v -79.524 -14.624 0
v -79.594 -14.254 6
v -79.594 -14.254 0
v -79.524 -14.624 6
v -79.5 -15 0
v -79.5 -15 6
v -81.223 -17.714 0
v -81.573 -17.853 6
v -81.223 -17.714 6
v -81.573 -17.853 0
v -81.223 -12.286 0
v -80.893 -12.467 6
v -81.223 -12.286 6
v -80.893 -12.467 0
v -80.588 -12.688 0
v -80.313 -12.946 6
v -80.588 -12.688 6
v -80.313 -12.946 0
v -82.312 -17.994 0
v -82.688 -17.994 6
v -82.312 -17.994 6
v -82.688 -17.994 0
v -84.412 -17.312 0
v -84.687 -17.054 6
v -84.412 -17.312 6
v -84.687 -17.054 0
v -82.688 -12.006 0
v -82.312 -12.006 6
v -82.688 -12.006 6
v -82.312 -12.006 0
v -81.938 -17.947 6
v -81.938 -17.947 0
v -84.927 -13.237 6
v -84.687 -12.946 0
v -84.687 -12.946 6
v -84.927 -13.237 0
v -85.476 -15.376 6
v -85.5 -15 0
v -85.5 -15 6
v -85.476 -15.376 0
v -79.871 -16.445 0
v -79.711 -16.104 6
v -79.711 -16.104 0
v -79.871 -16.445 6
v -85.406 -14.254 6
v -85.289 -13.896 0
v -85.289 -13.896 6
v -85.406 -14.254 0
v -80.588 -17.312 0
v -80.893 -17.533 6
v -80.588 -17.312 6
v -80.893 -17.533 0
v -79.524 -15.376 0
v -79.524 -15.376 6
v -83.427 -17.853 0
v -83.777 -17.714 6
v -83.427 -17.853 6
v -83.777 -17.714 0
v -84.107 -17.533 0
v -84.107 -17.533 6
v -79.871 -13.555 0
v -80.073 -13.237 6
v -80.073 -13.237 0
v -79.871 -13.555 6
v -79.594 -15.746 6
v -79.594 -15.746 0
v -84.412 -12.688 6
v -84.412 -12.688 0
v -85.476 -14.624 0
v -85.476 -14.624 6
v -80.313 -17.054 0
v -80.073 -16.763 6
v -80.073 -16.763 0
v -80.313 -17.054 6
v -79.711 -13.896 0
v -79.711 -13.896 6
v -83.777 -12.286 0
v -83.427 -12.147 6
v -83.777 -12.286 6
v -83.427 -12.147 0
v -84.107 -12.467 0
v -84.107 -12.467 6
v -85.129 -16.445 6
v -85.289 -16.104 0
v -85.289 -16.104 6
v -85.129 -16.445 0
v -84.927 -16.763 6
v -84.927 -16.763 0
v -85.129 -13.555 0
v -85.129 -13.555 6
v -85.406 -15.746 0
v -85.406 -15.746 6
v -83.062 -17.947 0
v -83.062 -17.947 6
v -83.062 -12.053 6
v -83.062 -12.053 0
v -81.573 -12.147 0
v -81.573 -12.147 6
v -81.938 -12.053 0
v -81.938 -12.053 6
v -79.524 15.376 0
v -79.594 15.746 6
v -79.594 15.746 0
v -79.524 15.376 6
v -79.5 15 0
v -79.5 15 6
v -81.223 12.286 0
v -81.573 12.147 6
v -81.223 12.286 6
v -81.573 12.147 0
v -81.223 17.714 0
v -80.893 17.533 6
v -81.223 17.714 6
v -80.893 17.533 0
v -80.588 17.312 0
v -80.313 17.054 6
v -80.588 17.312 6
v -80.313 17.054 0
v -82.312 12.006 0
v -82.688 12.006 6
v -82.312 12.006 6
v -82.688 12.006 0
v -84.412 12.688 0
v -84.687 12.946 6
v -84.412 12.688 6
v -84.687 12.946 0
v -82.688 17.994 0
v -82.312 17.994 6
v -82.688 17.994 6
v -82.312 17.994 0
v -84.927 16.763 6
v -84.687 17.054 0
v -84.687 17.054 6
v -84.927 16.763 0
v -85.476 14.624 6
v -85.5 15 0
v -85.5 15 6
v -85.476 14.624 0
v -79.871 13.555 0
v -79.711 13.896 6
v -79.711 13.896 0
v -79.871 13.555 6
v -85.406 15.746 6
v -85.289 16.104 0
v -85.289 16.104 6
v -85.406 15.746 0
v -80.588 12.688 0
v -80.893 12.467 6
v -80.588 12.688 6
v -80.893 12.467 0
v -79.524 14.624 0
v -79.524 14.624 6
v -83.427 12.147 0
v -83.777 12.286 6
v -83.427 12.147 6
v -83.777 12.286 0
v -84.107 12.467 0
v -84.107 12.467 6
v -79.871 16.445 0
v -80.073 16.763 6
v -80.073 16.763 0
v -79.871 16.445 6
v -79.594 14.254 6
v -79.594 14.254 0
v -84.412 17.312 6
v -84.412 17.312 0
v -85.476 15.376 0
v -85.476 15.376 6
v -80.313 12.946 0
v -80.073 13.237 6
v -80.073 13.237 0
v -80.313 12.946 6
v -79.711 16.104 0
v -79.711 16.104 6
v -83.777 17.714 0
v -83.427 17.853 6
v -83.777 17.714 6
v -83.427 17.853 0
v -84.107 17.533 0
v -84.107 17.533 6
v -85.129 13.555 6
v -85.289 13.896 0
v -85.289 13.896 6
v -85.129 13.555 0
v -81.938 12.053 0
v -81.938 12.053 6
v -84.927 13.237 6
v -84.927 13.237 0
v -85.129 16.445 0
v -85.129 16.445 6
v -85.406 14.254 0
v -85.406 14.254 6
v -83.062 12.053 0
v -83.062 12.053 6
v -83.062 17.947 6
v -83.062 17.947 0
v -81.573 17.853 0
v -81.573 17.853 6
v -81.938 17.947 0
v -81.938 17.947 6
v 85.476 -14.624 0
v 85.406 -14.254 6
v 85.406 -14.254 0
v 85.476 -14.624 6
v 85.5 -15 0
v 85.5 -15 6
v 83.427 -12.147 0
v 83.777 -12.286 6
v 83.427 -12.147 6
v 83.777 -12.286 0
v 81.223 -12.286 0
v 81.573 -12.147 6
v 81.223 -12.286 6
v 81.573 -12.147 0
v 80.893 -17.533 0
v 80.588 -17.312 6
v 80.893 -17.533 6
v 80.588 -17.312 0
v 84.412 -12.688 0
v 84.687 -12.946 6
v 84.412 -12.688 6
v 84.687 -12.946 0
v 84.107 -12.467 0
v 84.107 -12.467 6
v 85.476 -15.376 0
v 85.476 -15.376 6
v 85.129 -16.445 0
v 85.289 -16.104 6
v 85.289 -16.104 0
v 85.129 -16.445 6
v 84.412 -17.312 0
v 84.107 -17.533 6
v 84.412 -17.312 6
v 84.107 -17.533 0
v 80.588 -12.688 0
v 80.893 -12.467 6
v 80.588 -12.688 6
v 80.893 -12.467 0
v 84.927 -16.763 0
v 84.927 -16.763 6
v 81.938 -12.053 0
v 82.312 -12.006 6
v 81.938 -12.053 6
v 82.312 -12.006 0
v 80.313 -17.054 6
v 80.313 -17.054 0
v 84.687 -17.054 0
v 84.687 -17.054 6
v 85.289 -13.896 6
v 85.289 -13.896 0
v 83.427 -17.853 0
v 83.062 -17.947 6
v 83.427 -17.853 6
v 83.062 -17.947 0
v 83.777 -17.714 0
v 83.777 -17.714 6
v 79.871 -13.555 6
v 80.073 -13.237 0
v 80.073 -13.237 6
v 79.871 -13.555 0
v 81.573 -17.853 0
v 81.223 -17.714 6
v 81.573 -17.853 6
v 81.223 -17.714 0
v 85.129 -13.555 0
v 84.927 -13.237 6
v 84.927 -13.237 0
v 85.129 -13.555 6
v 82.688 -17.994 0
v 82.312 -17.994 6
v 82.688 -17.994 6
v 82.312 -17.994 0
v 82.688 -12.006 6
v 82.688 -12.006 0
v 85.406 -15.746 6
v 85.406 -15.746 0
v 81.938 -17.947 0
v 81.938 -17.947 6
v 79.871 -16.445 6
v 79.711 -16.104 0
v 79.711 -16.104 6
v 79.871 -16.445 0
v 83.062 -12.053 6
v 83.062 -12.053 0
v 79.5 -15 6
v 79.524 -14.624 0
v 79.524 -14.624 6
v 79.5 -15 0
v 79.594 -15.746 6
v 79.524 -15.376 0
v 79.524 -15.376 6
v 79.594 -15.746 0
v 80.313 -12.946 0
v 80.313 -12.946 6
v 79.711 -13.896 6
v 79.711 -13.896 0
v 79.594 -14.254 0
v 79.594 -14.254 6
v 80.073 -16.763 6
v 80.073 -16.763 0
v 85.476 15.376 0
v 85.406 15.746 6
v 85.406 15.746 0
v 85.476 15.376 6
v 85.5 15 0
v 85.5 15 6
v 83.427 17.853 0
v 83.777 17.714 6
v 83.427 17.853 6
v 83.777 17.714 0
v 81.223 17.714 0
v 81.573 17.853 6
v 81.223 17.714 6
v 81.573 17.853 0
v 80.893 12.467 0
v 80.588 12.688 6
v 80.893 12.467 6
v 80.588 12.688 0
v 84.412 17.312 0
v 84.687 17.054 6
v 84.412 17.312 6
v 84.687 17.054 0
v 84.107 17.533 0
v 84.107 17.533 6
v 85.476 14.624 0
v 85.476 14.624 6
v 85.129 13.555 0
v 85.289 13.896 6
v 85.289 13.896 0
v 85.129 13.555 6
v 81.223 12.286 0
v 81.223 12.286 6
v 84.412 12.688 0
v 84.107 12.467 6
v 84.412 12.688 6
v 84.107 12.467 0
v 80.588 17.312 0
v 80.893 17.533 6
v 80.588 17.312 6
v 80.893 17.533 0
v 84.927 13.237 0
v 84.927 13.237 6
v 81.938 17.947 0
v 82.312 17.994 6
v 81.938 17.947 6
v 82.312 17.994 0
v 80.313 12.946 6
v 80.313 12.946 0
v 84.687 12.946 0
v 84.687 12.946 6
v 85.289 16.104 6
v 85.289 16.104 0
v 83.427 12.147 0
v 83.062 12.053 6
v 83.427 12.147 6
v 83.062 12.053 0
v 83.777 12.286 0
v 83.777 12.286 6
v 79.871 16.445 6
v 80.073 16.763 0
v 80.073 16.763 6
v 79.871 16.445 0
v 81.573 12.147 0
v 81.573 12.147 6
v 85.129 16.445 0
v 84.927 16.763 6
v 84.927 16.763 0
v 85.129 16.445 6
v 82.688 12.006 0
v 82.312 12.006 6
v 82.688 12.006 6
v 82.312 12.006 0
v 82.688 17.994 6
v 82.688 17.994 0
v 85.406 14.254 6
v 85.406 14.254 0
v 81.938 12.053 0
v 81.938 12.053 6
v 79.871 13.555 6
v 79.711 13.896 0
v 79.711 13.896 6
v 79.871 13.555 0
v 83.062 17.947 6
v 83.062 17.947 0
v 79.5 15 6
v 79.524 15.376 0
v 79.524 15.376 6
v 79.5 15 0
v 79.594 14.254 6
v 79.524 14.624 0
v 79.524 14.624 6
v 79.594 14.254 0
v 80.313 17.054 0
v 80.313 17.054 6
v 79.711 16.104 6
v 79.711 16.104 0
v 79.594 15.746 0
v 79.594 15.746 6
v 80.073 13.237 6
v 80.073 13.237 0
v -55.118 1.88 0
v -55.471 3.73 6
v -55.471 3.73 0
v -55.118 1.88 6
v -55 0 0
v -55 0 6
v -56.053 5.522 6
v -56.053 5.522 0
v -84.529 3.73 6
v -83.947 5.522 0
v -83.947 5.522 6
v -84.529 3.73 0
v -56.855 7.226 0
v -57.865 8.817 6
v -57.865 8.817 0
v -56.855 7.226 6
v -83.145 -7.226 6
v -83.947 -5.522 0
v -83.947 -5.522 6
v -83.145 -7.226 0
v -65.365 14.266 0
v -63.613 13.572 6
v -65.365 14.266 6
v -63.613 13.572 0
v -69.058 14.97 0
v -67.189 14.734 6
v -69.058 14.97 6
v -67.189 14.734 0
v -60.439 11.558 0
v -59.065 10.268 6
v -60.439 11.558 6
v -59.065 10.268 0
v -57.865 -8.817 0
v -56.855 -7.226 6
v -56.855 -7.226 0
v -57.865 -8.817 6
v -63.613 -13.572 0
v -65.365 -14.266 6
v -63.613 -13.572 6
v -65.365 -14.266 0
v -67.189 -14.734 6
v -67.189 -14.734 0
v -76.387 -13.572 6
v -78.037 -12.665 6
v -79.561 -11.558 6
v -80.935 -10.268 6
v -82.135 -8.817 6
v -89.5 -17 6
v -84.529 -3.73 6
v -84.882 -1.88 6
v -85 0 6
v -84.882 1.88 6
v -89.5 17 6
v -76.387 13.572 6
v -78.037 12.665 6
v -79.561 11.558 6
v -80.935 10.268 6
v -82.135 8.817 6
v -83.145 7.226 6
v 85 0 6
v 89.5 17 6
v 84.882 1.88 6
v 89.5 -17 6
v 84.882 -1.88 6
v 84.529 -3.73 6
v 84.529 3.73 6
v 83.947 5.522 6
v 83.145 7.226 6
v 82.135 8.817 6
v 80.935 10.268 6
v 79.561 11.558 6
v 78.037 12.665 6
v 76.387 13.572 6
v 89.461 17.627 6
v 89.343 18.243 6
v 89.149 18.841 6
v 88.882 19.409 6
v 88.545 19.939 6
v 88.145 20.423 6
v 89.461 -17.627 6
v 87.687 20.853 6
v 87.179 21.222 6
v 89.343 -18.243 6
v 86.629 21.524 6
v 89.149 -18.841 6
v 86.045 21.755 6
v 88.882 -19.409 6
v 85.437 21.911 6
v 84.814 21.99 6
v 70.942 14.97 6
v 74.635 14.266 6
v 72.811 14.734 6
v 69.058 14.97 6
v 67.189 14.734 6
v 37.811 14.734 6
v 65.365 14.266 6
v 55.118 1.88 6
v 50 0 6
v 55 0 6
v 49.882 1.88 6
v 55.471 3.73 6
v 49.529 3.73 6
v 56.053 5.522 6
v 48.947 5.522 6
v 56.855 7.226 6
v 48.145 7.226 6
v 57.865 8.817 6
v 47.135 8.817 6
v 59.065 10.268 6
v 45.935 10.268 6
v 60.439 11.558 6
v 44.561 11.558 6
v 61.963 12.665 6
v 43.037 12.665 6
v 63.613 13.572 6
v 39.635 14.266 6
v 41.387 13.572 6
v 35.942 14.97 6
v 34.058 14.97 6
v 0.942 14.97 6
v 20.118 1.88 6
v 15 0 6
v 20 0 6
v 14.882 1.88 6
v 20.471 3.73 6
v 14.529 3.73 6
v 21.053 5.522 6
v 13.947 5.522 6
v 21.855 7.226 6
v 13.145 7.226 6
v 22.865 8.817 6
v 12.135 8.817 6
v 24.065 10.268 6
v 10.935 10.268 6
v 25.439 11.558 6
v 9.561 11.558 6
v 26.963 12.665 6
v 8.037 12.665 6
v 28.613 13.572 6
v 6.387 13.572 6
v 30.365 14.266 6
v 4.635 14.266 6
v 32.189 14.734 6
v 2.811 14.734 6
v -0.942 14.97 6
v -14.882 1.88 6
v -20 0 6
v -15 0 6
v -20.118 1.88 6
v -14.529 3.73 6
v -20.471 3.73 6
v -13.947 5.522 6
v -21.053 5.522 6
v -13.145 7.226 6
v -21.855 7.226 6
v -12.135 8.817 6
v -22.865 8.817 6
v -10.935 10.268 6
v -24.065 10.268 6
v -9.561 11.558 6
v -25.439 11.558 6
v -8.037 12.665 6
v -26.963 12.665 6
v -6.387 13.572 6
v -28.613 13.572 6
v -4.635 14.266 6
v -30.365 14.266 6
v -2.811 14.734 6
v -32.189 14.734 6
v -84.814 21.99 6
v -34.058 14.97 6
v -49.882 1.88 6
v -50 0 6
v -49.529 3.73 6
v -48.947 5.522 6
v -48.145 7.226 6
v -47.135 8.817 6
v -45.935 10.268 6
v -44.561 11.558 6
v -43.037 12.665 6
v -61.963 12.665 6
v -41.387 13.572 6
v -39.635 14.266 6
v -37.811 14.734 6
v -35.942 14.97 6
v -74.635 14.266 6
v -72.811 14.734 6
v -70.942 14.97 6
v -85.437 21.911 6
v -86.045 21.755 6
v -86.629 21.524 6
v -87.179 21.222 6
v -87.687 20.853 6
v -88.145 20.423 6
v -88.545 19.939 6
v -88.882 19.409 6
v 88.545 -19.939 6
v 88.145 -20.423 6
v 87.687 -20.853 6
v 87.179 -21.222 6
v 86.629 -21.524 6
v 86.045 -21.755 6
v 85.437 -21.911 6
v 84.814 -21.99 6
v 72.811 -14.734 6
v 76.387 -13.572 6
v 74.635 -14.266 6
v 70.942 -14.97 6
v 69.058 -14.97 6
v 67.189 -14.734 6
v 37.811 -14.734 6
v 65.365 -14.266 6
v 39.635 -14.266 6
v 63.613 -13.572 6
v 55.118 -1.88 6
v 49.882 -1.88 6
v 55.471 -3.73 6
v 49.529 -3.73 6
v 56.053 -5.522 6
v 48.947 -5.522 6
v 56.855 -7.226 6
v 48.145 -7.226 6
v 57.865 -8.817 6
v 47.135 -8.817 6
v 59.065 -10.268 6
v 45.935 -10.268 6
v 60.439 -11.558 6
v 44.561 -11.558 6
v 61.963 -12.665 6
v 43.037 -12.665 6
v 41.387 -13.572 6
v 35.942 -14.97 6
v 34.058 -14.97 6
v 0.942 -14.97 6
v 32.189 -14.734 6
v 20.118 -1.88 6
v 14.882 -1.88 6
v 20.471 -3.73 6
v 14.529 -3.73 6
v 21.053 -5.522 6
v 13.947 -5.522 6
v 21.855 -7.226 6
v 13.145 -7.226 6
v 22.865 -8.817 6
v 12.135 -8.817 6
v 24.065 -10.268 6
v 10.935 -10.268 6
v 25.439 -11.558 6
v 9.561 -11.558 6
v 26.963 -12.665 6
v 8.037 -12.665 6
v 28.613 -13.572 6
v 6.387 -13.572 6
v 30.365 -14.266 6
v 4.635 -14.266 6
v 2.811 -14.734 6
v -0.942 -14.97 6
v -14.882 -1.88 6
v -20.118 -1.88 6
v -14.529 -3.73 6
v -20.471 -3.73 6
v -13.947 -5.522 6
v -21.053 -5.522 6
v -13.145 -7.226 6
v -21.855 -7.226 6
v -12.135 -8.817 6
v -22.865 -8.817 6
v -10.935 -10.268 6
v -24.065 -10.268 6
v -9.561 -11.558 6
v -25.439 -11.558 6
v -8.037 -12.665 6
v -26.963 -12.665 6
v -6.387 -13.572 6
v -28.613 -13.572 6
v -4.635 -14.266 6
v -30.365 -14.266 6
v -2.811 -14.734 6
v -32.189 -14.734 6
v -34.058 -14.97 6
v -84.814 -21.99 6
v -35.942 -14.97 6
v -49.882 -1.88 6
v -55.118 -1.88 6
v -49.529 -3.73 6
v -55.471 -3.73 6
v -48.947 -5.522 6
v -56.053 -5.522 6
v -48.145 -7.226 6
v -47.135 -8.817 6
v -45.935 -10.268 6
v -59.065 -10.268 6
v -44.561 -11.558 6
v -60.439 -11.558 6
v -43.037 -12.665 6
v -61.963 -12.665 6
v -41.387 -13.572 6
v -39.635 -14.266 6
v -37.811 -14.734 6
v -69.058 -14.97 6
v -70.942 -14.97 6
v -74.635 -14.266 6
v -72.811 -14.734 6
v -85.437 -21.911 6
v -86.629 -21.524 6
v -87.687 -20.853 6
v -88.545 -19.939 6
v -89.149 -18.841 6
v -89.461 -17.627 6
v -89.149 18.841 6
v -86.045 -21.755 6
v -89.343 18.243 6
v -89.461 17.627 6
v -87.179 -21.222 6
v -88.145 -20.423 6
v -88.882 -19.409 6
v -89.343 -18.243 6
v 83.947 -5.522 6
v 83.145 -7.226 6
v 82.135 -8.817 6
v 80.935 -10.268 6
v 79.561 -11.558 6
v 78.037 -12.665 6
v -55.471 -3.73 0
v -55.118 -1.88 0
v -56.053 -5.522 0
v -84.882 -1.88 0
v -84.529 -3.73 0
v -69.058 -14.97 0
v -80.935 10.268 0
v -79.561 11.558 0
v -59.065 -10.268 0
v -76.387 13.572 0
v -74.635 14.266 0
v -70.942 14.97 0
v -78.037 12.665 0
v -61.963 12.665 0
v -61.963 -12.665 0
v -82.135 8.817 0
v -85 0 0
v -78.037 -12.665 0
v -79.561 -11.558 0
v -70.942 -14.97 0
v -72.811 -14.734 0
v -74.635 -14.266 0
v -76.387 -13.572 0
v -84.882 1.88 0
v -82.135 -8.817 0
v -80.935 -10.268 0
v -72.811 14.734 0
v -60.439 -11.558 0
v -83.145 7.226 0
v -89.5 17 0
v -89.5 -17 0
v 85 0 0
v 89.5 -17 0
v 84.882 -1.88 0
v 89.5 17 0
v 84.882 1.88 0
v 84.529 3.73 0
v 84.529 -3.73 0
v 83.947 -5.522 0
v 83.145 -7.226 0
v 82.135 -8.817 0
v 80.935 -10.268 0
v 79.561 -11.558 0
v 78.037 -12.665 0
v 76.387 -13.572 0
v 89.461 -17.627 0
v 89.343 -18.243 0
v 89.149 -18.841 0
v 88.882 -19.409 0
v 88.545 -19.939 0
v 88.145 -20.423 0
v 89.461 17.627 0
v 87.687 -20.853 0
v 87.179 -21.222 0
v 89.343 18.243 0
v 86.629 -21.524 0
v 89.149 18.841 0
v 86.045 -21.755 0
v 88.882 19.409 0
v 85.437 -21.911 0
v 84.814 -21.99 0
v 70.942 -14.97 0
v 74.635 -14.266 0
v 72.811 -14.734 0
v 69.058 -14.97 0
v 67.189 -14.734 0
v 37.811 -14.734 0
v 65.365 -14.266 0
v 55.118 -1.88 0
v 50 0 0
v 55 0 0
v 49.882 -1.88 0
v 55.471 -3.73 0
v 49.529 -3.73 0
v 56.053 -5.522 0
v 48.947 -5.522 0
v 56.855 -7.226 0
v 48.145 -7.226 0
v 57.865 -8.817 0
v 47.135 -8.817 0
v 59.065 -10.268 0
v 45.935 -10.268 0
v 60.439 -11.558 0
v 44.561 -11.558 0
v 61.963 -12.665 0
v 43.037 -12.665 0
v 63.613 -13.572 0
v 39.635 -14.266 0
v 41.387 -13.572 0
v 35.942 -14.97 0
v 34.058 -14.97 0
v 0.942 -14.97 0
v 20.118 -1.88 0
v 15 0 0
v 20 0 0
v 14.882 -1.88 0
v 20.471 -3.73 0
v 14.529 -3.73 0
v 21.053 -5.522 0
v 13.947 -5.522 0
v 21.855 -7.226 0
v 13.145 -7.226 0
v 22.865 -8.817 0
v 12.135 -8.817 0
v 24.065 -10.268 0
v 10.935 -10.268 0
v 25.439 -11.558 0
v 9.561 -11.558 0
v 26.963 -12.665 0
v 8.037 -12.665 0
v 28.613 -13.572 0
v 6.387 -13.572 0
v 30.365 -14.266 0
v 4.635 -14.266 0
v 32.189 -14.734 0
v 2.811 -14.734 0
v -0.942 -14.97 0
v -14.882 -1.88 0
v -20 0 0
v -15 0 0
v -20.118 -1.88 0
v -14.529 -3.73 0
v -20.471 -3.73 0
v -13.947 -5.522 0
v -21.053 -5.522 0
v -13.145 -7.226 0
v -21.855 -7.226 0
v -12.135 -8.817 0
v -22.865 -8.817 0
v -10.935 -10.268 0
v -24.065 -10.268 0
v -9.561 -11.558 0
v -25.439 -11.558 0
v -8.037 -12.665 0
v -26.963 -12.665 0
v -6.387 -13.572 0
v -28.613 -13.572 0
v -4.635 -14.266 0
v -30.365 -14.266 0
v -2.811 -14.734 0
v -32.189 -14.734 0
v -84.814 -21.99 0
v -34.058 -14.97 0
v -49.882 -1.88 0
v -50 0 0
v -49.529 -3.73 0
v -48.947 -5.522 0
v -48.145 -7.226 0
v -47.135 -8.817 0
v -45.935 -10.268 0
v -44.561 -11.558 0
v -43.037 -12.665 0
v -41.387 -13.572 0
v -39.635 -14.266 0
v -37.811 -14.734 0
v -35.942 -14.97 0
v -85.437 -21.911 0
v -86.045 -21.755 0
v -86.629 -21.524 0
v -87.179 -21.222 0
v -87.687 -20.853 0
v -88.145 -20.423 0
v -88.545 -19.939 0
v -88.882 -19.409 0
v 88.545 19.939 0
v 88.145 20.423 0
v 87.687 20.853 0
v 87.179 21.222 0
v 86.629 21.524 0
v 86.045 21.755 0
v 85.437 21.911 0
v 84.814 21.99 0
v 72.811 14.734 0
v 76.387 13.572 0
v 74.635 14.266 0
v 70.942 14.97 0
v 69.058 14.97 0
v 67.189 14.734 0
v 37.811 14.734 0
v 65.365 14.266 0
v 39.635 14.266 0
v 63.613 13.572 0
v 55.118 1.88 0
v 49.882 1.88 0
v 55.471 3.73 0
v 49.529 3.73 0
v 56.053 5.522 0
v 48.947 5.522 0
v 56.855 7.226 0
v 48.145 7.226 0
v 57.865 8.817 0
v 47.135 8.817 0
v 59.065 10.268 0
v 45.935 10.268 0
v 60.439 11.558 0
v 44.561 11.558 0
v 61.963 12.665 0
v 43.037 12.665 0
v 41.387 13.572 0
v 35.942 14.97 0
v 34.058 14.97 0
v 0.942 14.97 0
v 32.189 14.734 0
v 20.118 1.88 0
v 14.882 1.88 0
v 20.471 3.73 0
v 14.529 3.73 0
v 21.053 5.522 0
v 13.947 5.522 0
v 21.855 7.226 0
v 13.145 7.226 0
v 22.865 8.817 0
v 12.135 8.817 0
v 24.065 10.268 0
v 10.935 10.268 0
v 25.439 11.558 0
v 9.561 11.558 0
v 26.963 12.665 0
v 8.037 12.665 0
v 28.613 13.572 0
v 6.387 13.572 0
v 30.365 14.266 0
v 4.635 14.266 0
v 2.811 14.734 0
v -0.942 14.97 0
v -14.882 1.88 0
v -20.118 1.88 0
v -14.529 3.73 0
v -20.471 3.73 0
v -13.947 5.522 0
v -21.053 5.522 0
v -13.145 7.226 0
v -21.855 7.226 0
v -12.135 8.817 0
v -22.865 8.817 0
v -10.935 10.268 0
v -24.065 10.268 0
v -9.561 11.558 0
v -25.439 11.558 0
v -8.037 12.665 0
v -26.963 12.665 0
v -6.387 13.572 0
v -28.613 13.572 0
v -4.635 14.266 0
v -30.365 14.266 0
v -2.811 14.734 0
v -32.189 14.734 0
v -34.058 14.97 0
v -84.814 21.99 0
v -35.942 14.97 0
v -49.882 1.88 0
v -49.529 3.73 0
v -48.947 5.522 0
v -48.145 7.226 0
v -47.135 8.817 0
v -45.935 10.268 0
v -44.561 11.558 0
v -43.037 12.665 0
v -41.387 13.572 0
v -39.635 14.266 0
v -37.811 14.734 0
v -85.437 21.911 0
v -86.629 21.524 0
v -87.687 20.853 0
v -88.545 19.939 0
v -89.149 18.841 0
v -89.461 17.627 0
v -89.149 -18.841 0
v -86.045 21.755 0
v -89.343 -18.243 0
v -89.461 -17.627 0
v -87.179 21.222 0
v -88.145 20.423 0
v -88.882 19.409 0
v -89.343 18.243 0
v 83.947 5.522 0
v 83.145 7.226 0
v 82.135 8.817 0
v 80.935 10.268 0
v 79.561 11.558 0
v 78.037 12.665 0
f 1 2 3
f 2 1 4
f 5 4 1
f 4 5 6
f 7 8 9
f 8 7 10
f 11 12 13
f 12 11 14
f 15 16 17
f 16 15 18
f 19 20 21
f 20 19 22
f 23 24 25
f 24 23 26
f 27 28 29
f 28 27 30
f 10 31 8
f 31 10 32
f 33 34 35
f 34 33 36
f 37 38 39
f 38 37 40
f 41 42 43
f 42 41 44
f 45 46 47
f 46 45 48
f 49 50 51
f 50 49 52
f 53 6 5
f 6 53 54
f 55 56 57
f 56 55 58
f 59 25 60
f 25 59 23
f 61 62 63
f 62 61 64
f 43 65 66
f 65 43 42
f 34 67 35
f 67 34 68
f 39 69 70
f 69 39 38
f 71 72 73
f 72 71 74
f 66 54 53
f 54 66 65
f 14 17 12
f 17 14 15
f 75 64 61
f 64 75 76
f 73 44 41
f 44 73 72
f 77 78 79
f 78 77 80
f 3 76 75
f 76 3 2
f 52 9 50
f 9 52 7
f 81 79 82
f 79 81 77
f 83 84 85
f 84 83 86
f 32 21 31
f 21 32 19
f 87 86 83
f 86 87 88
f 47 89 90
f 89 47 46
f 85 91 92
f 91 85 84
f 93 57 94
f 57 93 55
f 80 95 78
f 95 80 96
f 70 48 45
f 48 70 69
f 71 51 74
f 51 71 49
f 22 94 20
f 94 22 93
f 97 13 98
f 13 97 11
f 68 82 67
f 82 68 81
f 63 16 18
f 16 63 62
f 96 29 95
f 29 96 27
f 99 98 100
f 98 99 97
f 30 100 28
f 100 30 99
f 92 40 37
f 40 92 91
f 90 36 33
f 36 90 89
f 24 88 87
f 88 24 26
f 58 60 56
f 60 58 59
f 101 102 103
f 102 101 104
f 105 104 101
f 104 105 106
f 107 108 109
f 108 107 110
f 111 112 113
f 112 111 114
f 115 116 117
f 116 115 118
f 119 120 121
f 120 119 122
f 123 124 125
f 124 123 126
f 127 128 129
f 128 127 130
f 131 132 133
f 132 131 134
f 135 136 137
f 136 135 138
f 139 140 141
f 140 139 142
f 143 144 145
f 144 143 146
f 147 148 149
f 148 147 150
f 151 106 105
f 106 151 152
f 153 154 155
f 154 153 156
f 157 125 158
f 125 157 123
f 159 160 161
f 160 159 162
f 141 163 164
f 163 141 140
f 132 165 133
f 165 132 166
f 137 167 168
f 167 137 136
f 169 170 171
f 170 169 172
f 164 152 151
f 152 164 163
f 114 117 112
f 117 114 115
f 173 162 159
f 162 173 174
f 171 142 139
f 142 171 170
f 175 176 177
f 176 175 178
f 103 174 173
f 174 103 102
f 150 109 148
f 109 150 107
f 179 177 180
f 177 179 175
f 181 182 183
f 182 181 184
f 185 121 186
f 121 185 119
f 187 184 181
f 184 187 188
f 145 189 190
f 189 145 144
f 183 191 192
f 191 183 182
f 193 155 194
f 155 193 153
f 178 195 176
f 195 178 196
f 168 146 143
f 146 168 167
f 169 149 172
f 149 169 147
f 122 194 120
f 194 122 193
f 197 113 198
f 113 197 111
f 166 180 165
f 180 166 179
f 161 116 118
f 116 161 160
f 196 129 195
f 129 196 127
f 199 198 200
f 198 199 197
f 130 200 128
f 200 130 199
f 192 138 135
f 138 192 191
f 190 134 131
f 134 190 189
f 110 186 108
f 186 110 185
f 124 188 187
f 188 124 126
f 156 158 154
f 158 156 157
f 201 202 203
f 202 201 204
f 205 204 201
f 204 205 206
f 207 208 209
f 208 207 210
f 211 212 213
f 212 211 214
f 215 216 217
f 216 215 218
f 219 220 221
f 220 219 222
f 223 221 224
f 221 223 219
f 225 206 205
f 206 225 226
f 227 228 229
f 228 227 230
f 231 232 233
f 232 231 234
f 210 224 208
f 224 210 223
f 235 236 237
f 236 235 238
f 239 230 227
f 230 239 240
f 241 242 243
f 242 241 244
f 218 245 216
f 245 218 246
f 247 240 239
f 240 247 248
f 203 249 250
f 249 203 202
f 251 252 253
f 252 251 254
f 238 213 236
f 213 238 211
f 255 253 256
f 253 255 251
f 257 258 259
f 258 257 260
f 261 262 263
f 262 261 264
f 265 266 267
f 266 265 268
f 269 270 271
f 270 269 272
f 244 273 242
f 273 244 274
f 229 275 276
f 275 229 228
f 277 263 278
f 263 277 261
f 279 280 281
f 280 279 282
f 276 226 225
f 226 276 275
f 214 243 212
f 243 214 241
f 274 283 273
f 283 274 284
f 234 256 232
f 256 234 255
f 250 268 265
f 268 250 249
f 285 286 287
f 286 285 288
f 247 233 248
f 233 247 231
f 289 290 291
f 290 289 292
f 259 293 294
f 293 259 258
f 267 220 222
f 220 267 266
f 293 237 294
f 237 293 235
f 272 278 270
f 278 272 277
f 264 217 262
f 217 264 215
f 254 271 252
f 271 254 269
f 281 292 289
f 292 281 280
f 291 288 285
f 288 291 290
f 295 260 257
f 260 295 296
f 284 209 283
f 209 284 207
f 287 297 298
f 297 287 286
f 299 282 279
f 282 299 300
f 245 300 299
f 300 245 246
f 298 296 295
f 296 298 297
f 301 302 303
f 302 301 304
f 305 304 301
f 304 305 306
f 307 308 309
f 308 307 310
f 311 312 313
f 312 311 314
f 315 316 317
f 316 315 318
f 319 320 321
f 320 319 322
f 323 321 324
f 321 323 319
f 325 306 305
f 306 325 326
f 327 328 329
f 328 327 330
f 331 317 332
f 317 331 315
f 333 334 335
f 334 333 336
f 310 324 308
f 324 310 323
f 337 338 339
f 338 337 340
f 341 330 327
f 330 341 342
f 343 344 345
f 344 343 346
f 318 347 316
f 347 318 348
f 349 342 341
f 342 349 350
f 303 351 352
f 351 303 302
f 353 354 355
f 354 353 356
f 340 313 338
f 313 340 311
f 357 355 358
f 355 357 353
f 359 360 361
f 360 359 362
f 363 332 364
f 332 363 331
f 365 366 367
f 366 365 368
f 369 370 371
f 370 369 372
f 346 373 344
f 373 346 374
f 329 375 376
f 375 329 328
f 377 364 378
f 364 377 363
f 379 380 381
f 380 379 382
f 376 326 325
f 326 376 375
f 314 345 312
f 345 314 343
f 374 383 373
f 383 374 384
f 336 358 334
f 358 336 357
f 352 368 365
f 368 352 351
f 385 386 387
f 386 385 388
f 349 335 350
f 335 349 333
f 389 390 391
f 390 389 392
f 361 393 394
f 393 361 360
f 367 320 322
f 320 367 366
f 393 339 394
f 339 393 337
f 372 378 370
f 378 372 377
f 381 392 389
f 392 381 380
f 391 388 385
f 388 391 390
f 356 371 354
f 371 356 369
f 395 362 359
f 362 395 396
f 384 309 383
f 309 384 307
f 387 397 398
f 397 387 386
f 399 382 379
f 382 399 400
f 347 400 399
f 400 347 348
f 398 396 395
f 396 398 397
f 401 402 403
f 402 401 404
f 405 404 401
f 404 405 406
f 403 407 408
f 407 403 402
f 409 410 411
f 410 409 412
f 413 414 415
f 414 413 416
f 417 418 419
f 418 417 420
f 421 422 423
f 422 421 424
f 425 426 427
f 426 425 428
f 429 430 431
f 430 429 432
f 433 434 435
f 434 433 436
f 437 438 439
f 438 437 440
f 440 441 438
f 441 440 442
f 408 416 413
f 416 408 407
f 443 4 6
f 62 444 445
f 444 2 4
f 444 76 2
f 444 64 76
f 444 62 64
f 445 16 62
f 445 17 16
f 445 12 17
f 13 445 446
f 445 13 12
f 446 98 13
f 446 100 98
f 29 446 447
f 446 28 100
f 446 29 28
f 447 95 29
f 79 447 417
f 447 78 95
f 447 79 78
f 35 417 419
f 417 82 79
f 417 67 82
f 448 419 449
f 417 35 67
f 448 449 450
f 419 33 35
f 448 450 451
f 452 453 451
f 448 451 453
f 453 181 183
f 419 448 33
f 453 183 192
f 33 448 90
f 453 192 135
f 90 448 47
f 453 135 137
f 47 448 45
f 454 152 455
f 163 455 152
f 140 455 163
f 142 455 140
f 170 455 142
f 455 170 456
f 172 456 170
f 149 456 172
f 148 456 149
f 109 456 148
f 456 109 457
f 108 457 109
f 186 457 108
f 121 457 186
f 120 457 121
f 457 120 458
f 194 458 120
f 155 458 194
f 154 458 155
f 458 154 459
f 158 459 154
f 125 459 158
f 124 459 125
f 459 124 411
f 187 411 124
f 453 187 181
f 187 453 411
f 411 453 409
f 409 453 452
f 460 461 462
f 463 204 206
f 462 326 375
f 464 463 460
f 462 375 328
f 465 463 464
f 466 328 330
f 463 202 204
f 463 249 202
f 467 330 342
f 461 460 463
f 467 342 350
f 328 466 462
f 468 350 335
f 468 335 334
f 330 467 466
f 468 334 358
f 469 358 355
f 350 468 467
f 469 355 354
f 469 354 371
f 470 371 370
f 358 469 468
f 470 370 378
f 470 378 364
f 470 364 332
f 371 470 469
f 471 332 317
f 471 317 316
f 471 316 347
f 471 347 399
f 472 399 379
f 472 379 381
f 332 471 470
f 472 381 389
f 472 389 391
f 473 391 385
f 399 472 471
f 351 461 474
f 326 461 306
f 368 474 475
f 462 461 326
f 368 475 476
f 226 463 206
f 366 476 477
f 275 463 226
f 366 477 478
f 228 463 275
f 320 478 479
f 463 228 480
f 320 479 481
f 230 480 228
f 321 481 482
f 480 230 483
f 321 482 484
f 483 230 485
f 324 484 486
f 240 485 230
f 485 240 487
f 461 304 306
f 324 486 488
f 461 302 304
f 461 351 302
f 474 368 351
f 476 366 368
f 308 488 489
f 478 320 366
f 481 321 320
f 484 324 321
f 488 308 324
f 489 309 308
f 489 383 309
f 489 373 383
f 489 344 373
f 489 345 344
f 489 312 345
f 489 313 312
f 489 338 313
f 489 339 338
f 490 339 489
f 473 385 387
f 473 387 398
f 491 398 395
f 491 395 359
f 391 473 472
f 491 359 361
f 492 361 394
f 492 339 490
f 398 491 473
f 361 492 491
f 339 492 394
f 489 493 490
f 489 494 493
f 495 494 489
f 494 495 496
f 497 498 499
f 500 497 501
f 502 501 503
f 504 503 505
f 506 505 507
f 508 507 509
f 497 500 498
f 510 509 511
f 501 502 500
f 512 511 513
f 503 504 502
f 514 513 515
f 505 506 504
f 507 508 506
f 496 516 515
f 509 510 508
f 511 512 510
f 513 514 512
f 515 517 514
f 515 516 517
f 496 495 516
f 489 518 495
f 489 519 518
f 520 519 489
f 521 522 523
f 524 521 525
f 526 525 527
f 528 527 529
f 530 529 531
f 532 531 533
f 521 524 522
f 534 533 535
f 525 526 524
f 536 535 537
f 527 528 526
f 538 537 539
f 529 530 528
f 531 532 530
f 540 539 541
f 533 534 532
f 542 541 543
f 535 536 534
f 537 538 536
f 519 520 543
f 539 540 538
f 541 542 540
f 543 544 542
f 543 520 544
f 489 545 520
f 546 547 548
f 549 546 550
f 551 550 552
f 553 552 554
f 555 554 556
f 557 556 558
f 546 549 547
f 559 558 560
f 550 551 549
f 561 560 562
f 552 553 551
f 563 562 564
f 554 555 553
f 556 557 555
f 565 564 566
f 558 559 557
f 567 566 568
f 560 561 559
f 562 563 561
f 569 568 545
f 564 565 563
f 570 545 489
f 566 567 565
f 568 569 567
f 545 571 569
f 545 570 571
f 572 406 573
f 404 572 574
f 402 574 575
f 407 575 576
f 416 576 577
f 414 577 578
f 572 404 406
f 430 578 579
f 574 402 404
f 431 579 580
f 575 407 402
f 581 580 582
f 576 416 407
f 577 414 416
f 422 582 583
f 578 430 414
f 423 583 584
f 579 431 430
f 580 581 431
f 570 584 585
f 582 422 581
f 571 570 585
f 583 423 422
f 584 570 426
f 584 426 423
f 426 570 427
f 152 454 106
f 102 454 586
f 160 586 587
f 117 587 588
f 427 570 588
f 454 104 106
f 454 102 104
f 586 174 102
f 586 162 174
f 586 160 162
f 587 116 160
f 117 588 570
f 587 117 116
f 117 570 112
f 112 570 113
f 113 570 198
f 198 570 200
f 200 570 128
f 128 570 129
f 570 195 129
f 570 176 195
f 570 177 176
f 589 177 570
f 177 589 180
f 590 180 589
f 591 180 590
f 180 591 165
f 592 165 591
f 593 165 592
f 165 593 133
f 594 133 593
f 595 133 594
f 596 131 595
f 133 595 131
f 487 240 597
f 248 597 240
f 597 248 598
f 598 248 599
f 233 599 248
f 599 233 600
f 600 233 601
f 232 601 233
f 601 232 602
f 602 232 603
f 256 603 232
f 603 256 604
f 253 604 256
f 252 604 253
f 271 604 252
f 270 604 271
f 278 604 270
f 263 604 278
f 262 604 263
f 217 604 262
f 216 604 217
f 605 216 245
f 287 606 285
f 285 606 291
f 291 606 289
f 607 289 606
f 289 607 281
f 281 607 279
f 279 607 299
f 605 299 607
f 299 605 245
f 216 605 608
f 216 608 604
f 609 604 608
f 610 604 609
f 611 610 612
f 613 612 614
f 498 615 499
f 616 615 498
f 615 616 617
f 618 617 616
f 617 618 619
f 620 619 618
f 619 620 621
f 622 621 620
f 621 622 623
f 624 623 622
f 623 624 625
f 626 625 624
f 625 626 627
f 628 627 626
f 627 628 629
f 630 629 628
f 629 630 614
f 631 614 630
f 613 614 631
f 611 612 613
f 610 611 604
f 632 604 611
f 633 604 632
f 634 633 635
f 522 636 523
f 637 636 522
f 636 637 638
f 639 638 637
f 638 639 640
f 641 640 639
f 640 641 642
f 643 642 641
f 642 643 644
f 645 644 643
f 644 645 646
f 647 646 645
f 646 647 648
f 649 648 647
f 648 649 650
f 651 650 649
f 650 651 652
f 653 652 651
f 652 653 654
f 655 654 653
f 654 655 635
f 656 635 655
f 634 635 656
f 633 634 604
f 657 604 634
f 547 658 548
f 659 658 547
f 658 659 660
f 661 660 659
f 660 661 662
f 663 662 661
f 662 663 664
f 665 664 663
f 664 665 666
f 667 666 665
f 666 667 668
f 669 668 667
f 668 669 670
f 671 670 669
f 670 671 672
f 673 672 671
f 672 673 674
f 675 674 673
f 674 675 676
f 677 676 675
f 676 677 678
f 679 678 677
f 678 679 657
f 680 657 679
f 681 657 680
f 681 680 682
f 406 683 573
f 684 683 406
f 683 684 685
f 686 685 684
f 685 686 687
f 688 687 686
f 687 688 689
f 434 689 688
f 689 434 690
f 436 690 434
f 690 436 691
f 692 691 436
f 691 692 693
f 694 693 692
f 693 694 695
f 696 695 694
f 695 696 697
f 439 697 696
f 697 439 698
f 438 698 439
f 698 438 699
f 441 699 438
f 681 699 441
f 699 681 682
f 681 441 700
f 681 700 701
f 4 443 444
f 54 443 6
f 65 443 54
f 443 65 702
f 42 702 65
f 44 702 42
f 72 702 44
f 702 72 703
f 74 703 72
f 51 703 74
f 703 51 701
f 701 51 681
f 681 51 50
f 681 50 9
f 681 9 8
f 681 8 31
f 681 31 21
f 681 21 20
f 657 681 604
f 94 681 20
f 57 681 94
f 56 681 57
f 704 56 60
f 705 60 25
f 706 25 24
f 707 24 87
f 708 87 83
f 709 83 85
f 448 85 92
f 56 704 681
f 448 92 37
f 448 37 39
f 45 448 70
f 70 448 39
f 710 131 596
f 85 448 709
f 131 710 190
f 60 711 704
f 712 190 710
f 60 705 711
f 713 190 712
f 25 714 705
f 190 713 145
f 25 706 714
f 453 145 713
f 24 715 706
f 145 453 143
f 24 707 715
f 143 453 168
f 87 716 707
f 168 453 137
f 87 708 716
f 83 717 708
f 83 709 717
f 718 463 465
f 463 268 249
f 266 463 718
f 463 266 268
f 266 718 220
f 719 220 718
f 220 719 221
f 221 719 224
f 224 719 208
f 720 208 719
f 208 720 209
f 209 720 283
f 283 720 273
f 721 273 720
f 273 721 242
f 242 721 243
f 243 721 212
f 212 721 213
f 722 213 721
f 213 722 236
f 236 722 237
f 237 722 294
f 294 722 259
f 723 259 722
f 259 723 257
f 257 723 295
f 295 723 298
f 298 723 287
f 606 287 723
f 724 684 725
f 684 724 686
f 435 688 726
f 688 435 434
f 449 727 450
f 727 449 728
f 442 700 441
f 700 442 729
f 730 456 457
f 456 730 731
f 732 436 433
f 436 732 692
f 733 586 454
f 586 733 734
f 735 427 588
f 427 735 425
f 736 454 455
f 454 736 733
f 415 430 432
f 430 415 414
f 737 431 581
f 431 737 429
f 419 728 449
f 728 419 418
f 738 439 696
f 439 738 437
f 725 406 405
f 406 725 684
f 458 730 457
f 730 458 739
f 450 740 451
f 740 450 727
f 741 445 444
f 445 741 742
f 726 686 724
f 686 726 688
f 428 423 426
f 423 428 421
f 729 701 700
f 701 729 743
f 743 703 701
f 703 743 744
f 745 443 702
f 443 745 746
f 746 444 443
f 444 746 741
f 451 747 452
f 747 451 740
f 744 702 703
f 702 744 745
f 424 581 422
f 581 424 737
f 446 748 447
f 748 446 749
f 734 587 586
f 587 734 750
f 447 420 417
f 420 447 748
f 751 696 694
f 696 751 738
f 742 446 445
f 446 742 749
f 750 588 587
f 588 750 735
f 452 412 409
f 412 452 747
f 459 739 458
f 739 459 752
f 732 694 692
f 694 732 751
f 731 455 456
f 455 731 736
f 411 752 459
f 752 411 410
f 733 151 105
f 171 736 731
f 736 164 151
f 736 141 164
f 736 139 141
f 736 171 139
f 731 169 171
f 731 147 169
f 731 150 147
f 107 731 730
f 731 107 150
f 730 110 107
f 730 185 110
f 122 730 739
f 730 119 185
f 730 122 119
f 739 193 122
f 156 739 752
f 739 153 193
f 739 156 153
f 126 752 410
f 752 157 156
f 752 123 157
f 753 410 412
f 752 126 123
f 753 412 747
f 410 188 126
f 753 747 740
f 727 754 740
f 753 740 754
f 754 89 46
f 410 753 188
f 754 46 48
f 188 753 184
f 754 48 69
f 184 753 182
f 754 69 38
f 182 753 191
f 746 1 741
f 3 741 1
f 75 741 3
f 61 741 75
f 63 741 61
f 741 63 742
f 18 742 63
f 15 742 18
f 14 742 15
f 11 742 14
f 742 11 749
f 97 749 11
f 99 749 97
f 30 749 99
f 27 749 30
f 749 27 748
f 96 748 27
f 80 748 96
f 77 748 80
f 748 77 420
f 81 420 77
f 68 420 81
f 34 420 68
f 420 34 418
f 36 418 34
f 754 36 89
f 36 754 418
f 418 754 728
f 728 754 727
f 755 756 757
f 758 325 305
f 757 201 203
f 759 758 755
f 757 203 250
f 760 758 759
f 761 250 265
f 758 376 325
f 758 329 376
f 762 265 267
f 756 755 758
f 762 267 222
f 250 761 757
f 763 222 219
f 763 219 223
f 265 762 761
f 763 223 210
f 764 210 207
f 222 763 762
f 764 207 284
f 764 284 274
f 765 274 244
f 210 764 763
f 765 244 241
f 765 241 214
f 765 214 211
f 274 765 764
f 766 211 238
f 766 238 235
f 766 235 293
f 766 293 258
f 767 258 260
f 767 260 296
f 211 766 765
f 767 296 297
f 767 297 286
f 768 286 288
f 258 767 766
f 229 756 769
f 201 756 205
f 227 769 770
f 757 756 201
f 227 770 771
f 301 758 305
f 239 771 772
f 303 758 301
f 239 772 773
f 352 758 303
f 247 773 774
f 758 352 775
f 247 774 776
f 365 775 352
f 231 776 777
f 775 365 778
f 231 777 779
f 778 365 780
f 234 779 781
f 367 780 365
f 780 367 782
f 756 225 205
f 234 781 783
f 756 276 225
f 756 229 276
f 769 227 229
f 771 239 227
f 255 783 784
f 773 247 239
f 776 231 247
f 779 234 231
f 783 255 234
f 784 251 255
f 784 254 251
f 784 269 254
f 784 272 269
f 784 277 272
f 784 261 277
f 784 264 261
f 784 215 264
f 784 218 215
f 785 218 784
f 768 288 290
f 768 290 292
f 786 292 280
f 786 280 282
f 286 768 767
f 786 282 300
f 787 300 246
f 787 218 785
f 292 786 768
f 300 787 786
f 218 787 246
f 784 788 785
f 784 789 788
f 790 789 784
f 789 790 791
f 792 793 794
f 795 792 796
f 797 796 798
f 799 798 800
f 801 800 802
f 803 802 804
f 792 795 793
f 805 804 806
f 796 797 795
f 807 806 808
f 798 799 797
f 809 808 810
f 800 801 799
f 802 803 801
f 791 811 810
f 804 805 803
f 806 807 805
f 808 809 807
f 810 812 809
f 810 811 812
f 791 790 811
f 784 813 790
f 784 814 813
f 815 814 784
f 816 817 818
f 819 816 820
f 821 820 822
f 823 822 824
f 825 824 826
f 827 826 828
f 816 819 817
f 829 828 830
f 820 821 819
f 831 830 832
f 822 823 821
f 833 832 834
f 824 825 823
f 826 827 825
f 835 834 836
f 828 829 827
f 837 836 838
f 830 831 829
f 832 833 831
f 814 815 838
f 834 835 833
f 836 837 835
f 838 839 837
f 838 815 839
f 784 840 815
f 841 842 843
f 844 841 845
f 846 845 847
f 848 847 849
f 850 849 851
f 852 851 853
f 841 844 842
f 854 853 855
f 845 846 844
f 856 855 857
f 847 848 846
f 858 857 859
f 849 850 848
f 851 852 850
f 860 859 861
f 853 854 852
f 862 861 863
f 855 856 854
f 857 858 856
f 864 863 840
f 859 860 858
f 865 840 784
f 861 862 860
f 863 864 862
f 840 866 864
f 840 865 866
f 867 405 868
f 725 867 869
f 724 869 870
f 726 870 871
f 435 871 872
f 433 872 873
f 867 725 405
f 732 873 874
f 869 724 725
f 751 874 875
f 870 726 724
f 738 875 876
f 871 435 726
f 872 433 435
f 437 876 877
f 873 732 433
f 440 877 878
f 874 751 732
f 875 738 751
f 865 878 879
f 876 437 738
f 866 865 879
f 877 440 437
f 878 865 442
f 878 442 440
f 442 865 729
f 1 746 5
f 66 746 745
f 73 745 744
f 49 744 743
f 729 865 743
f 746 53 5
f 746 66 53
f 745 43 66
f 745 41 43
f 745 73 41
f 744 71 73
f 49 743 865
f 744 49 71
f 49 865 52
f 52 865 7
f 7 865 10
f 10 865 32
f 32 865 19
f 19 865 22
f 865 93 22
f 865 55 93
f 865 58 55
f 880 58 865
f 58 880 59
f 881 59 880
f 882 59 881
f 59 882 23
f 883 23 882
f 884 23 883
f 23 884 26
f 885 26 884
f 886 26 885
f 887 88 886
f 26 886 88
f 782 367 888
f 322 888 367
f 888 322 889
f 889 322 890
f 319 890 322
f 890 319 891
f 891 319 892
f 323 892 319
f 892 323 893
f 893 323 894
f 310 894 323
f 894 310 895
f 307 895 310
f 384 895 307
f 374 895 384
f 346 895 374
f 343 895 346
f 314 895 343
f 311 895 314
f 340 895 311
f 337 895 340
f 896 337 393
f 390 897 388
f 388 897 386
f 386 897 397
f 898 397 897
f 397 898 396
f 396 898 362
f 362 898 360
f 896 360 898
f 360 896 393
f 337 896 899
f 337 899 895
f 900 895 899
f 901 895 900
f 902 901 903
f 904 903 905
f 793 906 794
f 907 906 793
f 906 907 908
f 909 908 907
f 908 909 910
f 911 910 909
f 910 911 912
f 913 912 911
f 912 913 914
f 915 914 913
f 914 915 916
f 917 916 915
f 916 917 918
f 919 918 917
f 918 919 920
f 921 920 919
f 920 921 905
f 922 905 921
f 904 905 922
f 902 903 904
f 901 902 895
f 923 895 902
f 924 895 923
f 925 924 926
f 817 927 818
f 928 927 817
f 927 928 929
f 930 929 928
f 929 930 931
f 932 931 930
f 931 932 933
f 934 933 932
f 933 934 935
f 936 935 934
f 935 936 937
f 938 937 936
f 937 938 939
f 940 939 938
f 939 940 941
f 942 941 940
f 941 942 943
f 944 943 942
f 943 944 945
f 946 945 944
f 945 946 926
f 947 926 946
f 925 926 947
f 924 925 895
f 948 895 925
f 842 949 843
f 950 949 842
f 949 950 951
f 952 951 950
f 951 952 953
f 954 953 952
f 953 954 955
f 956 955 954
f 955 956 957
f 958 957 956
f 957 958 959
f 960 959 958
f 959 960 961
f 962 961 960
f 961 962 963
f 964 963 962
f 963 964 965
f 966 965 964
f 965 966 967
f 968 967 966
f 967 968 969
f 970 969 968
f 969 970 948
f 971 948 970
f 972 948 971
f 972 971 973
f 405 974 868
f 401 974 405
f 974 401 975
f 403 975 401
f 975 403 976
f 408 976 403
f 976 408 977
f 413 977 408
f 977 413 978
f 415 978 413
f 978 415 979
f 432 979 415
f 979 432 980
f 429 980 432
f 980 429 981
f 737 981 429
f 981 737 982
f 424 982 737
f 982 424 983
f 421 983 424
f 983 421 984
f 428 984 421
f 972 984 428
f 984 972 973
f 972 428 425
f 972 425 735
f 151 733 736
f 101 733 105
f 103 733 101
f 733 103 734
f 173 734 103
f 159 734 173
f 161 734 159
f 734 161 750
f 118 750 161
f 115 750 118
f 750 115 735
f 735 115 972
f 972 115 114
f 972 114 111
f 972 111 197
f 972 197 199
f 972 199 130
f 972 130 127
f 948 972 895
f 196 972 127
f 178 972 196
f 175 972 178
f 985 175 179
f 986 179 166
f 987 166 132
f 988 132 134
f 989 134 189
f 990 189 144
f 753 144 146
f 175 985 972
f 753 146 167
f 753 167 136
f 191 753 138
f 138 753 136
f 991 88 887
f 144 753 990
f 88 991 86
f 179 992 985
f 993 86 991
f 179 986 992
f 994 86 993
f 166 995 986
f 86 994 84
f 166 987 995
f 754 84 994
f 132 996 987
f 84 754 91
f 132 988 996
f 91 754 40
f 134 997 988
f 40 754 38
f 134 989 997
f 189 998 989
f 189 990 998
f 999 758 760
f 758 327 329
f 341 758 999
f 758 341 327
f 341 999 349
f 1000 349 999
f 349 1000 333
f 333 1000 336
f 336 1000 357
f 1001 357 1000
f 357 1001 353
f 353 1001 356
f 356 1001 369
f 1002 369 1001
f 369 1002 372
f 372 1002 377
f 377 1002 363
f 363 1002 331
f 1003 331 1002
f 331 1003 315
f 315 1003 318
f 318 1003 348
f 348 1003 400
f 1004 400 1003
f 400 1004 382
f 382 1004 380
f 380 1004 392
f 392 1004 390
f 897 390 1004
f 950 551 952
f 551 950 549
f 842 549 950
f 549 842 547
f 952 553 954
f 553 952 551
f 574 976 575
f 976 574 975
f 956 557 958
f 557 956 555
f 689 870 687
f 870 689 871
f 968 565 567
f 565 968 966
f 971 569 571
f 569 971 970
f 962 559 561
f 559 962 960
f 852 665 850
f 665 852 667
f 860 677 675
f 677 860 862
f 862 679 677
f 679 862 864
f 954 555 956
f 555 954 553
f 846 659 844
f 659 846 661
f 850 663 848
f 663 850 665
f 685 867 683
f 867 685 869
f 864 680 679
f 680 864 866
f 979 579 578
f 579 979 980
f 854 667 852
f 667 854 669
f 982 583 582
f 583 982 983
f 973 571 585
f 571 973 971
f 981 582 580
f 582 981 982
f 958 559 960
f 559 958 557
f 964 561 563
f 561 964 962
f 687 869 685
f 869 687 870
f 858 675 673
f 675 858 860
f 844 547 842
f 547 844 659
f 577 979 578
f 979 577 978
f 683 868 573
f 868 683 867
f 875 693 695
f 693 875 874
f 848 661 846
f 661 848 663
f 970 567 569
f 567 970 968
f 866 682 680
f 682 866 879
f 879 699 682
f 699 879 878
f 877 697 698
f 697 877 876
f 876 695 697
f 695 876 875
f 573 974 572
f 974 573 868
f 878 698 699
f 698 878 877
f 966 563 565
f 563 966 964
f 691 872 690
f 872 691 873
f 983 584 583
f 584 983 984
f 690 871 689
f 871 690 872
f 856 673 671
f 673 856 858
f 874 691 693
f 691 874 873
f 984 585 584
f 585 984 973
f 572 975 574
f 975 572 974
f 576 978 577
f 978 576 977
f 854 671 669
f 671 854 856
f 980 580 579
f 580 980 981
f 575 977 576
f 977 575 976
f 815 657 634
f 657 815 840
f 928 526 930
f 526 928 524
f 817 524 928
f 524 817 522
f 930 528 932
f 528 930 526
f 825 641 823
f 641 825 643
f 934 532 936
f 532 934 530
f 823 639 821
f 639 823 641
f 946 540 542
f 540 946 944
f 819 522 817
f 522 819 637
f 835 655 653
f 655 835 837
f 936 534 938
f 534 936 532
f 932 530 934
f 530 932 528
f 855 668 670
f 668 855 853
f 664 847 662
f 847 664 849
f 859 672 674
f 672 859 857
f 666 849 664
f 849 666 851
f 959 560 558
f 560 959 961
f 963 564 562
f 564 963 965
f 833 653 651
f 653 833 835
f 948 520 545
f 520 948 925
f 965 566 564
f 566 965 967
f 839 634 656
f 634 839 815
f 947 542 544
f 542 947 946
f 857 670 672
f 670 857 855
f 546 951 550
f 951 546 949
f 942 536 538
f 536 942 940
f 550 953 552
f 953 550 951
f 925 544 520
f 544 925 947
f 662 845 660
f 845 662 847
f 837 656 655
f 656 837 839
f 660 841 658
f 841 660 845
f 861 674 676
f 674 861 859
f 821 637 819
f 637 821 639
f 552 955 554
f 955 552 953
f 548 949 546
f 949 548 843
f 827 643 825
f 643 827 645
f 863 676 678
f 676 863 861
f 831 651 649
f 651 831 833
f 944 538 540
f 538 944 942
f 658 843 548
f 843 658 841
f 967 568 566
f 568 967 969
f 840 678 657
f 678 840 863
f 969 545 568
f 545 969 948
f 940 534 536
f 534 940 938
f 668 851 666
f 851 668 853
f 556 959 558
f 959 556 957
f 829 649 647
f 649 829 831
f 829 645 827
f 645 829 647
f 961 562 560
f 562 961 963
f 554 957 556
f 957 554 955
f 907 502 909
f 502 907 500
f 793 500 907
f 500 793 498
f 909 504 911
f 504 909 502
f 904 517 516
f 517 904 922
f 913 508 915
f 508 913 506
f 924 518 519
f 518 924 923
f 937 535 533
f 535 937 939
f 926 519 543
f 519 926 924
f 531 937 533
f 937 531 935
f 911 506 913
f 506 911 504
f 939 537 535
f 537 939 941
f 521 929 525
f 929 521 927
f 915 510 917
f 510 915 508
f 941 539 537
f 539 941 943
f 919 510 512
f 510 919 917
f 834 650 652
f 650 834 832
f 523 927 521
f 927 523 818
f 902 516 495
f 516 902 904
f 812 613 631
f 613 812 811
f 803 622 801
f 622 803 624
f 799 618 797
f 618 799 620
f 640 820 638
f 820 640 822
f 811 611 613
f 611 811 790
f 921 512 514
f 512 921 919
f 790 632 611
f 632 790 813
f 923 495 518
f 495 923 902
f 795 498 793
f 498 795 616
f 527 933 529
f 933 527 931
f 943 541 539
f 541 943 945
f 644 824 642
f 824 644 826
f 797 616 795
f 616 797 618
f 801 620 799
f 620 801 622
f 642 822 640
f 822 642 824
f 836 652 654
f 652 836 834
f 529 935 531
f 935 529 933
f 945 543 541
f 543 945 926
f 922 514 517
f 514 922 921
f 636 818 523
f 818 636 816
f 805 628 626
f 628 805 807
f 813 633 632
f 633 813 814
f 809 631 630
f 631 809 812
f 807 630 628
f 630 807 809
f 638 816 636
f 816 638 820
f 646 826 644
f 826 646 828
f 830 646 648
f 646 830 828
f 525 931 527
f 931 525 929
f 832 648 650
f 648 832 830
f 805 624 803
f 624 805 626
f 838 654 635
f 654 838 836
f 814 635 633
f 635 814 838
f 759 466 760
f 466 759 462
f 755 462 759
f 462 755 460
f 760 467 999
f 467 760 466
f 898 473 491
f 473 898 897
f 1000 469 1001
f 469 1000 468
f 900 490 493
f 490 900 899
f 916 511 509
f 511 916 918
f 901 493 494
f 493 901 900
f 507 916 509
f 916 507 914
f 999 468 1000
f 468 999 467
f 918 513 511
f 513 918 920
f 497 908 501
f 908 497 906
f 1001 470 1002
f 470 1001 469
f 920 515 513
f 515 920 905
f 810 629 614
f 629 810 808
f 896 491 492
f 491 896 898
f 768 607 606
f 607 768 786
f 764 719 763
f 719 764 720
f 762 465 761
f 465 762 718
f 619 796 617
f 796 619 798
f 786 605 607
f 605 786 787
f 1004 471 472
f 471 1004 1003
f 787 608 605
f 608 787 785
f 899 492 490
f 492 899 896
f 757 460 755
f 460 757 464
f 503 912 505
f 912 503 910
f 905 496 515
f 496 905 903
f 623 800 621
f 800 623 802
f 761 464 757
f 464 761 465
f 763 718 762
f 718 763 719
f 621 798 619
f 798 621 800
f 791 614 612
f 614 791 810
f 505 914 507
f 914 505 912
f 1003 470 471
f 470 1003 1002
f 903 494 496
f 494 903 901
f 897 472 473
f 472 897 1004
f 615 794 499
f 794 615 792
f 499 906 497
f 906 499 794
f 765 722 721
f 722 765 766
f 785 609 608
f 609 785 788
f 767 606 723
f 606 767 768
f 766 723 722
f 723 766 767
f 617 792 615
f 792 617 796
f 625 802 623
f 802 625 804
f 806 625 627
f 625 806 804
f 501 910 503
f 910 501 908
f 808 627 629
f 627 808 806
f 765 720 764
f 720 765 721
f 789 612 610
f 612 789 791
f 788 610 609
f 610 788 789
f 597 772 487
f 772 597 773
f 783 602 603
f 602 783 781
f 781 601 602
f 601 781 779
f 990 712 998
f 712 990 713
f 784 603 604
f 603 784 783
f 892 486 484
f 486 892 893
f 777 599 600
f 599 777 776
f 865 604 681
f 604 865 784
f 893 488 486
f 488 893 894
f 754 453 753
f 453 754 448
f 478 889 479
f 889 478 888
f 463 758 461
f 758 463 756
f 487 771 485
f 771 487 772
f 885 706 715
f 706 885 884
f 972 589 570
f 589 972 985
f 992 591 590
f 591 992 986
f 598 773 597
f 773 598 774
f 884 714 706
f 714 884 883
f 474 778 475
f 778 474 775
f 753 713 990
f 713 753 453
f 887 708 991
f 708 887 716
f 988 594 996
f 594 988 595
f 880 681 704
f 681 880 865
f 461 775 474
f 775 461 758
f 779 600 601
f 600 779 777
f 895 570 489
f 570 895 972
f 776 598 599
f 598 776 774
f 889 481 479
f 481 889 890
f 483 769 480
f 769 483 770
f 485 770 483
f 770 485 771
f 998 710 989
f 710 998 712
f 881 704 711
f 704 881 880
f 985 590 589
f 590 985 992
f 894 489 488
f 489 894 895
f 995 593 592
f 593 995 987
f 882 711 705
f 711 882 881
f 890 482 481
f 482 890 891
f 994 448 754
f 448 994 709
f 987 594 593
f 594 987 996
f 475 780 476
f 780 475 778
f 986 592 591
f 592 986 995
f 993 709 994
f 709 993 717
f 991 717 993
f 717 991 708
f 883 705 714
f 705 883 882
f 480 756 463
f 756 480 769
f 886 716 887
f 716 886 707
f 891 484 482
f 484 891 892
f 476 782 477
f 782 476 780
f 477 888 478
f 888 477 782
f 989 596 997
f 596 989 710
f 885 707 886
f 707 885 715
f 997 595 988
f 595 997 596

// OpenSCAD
$fn = 50;

difference() {
	union() {
		hull() {
			translate(v = [-84.5, 17.0, 0]) {
				cylinder(h = 6, r = 5);
			}
			translate(v = [84.5, 17.0, 0]) {
				cylinder(h = 6, r = 5);
			}
			translate(v = [-84.5, -17.0, 0]) {
				cylinder(h = 6, r = 5);
			}
			translate(v = [84.5, -17.0, 0]) {
				cylinder(h = 6, r = 5);
			}
		}
	}
	union() {
		translate(v = [-82.5, -15.0, -100.0]) {
			cylinder(h = 200, r = 3.0);
		}
		translate(v = [-82.5, 15.0, -100.0]) {
			cylinder(h = 200, r = 3.0);
		}
		translate(v = [82.5, -15.0, -100.0]) {
			cylinder(h = 200, r = 3.0);
		}
		translate(v = [82.5, 15.0, -100.0]) {
			cylinder(h = 200, r = 3.0);
		}
		translate(v = [-82.5, -15.0, -100.0]) {
			cylinder(h = 200, r = 1.5);
		}
		translate(v = [-82.5, 15.0, -100.0]) {
			cylinder(h = 200, r = 1.5);
		}
		translate(v = [82.5, -15.0, -100.0]) {
			cylinder(h = 200, r = 1.5);
		}
		translate(v = [82.5, 15.0, -100.0]) {
			cylinder(h = 200, r = 1.5);
		}
		translate(v = [-70.0, 0, 0.0]) {
			cylinder(h = 6, r = 15.0);
		}
		translate(v = [-35.0, 0, 0.0]) {
			cylinder(h = 6, r = 15.0);
		}
		cylinder(h = 6, r = 15.0);
		translate(v = [35.0, 0, 0.0]) {
			cylinder(h = 6, r = 15.0);
		}
		translate(v = [70.0, 0, 0.0]) {
			cylinder(h = 6, r = 15.0);
		}
	}
}
